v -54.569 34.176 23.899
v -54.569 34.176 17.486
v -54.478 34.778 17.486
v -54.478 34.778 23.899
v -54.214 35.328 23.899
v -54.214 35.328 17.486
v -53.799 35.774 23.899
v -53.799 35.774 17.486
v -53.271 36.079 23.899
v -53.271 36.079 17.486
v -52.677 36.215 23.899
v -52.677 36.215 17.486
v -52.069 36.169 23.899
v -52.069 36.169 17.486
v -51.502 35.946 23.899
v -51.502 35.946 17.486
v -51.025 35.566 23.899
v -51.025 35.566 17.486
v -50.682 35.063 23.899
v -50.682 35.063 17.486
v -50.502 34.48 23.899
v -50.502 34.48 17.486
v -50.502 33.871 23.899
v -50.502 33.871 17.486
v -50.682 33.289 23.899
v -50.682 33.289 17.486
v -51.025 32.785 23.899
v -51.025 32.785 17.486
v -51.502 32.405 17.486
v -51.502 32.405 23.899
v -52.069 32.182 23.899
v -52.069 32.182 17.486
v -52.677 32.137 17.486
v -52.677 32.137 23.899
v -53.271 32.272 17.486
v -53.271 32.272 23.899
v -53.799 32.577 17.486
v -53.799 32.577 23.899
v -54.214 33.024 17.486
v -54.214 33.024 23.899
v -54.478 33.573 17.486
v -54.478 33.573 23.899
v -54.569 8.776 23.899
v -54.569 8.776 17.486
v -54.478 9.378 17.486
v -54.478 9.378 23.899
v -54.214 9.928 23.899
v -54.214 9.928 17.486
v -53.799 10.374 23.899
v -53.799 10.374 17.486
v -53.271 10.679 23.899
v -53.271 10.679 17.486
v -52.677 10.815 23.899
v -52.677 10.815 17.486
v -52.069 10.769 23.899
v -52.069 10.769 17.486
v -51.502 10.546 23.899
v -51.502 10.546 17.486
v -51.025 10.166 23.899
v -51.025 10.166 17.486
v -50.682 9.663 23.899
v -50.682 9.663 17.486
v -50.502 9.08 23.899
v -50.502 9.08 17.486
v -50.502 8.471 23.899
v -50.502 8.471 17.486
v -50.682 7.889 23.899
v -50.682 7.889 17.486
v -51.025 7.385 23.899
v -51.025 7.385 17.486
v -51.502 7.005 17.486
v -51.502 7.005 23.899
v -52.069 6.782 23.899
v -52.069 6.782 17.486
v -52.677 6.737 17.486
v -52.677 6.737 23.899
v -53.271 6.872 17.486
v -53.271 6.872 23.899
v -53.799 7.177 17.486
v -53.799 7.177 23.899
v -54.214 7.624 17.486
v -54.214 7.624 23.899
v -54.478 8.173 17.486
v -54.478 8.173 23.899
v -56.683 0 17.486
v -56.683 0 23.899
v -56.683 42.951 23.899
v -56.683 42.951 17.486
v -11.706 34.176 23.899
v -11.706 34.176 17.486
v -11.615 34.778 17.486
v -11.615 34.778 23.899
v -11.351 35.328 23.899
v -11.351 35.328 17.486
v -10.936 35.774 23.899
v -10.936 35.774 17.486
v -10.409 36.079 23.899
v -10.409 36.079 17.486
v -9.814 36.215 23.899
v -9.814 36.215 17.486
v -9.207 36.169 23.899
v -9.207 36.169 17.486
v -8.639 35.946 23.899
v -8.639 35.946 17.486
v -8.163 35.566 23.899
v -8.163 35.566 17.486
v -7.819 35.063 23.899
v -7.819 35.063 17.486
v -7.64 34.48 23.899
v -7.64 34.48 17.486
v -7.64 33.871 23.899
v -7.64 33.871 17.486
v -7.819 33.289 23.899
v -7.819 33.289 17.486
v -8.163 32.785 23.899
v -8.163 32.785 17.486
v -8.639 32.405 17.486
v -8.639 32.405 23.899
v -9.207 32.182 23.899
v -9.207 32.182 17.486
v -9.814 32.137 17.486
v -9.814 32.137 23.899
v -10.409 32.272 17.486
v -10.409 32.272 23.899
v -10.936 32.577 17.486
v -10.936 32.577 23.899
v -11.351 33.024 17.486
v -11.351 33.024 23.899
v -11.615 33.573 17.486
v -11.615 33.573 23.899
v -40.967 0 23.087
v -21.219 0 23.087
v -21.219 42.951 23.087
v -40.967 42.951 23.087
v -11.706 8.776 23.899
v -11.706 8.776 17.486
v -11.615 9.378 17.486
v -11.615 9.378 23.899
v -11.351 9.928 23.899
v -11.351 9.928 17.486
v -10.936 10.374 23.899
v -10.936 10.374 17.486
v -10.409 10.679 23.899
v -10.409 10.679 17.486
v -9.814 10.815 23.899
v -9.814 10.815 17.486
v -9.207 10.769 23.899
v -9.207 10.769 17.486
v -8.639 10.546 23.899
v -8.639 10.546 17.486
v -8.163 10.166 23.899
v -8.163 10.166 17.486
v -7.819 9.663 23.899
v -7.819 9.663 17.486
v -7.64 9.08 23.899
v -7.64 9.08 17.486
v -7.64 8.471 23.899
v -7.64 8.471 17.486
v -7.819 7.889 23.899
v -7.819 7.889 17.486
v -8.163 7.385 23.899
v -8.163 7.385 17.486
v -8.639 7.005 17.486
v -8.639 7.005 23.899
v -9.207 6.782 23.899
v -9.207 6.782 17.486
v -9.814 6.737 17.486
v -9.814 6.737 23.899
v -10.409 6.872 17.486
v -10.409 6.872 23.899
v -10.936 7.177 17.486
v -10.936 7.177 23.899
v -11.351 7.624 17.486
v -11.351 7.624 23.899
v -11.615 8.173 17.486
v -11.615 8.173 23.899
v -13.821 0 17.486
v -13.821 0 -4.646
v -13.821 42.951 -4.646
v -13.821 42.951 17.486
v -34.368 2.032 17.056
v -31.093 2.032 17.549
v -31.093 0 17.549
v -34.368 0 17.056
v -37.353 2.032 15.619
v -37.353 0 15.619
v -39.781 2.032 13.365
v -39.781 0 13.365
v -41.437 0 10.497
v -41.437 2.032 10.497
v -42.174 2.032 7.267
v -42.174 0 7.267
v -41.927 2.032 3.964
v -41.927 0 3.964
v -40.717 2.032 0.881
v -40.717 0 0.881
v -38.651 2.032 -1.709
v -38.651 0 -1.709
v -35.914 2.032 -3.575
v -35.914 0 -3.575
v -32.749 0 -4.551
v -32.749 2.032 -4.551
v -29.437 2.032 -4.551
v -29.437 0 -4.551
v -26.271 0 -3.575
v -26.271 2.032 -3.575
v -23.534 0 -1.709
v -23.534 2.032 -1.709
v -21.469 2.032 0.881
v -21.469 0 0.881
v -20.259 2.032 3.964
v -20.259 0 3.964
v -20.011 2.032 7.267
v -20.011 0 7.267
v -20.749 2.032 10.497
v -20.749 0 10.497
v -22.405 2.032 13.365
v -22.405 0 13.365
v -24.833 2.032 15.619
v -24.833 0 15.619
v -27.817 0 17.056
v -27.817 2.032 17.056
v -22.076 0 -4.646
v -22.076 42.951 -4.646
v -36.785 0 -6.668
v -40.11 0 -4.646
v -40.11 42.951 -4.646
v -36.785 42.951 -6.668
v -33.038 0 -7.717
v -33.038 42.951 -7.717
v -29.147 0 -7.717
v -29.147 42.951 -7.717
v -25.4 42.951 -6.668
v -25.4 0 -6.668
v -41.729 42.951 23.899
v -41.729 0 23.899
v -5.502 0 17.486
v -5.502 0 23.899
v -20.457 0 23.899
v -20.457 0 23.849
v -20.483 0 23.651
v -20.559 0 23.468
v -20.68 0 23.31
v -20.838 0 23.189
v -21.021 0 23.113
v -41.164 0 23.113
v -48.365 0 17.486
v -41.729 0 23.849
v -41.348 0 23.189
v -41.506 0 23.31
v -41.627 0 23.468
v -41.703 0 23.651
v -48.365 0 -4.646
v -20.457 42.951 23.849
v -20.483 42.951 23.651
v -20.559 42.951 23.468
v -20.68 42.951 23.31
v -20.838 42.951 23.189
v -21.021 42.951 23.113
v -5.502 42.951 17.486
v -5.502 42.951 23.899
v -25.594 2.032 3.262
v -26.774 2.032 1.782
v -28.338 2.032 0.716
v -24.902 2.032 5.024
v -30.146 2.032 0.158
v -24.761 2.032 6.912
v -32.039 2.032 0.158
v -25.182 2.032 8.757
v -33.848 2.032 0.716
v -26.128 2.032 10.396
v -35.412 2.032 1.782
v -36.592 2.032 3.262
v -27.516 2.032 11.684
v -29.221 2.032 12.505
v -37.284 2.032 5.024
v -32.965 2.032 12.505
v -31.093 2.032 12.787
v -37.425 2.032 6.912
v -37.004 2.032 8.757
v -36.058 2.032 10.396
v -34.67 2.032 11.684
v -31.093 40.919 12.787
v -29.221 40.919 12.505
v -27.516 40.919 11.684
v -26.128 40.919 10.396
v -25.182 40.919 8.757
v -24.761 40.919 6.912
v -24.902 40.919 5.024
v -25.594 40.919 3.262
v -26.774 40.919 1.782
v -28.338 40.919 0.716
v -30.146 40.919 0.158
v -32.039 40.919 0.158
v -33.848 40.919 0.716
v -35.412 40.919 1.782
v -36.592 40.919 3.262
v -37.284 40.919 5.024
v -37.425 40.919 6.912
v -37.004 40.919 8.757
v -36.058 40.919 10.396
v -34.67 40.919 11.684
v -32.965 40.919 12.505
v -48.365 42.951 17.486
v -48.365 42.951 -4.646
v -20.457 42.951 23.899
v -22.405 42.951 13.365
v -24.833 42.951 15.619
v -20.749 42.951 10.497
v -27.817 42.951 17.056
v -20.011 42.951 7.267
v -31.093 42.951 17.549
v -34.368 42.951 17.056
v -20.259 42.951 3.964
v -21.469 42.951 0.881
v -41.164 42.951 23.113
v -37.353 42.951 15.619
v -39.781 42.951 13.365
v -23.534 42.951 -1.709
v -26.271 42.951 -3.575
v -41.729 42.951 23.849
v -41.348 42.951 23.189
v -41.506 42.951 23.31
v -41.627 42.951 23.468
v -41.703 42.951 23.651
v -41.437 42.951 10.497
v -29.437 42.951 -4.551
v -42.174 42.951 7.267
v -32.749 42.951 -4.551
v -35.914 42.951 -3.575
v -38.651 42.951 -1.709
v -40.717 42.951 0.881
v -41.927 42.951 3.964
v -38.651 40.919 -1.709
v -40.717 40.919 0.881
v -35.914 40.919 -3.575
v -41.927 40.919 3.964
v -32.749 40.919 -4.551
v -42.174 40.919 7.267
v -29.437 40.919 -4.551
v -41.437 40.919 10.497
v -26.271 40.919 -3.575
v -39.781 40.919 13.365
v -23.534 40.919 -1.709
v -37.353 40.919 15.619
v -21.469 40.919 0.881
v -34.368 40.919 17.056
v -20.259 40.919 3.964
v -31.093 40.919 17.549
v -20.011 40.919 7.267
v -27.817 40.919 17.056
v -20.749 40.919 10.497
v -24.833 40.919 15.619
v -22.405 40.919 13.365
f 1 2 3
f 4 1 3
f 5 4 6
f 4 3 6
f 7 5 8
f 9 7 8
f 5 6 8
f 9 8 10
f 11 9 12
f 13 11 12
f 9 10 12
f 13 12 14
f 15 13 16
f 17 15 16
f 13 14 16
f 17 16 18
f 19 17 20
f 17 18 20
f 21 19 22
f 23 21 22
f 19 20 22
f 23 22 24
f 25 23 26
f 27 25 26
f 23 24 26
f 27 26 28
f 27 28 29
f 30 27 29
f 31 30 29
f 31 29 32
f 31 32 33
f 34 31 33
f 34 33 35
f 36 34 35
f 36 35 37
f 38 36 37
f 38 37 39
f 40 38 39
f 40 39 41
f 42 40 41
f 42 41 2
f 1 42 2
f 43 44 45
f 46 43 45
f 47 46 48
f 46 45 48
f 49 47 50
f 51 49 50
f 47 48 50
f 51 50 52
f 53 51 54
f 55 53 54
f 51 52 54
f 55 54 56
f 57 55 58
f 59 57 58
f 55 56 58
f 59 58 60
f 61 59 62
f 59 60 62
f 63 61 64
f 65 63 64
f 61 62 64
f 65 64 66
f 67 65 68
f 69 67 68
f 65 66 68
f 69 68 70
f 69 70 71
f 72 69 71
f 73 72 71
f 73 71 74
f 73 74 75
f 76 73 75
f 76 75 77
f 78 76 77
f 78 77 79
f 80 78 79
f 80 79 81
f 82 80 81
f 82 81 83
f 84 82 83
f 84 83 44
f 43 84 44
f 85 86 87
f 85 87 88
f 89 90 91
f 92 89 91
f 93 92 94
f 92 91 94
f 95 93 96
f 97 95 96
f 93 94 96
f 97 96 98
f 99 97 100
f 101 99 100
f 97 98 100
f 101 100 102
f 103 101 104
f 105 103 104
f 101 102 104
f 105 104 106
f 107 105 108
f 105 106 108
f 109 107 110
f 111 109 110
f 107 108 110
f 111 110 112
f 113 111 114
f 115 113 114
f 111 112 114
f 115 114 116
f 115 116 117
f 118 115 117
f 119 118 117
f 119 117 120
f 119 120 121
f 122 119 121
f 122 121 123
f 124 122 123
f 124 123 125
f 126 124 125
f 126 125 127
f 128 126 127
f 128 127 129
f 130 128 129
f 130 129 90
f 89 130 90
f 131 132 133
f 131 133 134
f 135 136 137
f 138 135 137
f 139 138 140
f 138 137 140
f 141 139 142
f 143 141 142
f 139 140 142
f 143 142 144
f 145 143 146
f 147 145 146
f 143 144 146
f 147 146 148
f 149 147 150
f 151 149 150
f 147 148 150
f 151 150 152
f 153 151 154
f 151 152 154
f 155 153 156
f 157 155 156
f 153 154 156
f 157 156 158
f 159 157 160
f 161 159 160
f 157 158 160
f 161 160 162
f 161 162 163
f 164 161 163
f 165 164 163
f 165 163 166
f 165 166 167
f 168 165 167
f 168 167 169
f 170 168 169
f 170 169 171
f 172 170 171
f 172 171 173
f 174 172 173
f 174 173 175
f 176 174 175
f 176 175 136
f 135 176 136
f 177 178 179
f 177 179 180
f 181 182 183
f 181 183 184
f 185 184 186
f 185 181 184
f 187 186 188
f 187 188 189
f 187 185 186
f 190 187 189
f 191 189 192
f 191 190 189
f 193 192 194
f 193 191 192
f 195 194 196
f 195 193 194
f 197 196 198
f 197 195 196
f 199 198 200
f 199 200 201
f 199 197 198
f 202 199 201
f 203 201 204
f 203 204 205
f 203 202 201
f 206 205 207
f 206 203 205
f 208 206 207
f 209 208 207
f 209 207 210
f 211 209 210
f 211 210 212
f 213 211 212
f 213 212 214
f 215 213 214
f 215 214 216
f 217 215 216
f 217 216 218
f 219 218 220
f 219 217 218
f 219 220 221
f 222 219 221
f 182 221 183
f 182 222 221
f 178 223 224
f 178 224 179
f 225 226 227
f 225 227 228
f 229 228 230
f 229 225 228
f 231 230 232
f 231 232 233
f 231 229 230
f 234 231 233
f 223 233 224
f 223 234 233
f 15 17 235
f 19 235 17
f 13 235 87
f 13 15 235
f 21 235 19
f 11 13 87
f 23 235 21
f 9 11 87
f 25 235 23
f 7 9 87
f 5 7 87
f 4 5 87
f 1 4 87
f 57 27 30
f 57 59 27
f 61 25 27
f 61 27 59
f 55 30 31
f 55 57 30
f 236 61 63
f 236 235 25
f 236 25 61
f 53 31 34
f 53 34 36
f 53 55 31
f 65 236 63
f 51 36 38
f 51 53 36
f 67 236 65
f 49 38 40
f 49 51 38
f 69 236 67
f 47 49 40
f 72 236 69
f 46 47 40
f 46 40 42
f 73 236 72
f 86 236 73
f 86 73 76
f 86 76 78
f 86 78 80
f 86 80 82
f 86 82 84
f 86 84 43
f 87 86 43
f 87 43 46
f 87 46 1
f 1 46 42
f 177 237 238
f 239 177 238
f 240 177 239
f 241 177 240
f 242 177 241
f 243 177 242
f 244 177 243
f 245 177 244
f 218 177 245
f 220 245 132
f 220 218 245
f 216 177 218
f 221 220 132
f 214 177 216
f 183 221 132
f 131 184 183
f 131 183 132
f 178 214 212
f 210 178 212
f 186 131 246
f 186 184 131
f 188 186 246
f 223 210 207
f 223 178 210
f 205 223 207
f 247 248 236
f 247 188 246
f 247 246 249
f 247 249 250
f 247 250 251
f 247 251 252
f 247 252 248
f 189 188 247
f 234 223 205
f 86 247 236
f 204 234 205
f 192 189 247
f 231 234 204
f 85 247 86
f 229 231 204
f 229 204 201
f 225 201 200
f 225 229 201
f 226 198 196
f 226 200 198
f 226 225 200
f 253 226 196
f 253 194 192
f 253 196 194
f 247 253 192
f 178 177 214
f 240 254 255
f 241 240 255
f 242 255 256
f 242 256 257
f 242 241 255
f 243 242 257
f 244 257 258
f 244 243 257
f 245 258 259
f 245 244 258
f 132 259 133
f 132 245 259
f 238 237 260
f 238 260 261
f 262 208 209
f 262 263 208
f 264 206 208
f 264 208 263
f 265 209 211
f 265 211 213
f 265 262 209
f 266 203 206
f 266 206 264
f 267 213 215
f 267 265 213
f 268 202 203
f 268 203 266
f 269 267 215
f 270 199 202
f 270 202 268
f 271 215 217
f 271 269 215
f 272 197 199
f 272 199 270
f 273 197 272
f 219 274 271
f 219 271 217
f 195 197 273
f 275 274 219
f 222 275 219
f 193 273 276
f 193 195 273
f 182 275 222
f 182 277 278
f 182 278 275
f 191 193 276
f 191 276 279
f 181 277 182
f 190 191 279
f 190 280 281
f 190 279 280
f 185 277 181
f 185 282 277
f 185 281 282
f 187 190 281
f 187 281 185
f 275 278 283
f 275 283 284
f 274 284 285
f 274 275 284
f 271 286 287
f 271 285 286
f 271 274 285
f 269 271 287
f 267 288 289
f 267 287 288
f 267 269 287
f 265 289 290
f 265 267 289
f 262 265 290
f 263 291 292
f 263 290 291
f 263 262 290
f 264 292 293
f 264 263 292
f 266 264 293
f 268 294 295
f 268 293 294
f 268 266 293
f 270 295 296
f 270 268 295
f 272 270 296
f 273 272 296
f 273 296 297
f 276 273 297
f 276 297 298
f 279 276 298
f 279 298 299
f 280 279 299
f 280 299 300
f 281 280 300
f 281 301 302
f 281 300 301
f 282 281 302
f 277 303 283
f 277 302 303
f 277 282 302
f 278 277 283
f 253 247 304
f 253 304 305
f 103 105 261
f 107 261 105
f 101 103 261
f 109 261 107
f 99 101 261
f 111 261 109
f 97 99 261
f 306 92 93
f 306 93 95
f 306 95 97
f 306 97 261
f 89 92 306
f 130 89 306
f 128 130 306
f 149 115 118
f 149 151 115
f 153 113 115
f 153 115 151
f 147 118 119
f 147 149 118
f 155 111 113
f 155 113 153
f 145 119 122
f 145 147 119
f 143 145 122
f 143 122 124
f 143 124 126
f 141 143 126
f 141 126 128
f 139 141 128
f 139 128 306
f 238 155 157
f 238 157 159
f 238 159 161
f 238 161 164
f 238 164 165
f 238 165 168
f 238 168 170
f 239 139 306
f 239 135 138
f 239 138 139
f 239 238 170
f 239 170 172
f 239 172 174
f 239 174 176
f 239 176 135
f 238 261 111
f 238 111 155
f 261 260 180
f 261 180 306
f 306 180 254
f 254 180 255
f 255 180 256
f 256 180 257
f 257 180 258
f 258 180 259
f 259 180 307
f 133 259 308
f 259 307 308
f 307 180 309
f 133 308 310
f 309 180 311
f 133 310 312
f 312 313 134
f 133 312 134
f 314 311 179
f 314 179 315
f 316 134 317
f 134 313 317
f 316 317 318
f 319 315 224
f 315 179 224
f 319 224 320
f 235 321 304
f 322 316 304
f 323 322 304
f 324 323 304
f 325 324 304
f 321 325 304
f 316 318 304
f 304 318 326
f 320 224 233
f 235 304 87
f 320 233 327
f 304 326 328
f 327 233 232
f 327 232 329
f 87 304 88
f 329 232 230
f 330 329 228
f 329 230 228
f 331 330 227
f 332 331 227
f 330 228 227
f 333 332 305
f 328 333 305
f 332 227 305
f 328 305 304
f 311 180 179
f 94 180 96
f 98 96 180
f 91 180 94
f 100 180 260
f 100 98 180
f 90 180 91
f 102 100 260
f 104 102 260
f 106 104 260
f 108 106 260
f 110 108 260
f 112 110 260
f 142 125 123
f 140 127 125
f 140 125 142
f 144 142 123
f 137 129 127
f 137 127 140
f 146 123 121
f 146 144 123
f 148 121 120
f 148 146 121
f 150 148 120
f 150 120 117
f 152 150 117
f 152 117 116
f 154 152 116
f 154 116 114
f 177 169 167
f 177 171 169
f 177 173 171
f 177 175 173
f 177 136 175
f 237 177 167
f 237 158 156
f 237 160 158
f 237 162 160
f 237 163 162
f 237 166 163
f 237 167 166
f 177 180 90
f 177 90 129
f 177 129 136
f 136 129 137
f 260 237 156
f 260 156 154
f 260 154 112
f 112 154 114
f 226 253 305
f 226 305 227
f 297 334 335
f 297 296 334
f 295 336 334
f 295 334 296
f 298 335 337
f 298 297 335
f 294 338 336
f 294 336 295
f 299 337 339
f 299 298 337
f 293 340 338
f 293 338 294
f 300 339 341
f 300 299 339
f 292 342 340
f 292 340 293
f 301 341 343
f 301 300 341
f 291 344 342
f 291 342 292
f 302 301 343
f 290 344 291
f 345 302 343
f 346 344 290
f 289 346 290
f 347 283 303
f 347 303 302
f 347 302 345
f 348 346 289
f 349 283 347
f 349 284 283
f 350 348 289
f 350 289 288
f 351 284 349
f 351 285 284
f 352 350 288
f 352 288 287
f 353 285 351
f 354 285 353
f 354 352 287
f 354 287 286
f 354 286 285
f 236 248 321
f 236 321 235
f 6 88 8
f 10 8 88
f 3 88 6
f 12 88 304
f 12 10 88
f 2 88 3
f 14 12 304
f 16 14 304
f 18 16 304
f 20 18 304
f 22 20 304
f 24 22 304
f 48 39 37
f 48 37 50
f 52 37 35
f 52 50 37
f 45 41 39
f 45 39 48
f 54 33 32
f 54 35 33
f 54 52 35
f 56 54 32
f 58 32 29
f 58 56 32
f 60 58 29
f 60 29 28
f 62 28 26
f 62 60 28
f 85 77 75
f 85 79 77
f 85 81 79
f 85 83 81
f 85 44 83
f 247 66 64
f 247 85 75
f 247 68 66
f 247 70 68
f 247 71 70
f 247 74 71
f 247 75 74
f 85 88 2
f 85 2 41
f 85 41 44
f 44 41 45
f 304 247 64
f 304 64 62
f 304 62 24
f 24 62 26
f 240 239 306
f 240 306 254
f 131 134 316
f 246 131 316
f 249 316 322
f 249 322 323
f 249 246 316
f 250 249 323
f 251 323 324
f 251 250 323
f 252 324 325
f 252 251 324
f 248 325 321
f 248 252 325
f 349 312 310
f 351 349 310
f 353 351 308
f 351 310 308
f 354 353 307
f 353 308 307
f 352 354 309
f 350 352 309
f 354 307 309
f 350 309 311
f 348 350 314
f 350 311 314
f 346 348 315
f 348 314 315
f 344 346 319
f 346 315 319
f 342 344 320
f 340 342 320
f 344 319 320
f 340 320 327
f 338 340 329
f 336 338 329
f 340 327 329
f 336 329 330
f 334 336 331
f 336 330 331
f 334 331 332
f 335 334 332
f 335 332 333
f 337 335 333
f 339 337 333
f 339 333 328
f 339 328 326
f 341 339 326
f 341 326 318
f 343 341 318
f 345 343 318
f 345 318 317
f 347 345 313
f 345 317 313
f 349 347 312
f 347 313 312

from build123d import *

# Parameters (mm, degrees)
SKETCH1_R           = 6.35
BOSS_EXTRUDE1_DEPTH = 42.9514
SKETCH2_R           = 11.1125
CUT_EXTRUDE1_DEPTH  = 2.032
CUT_EXTRUDE2_START  = -2.032
SKETCH3_R           = 11.1125
CUT_EXTRUDE2_DEPTH  = 2.032
SKETCH8_R           = 2.0447
CUT_EXTRUDE3_DEPTH  = 76.496791448


with BuildPart() as part:
    # Sketch1 → Boss-Extrude1 (new body)
    with BuildSketch(Plane(origin=(0, 0, 0), x_dir=(1, 0, 0), z_dir=(0, 1, 0))):
        with BuildLine():
            Line((-41.729120795, -23.848667038), (-41.729120795, -23.899467038))
            Line((-41.729120795, -23.899467038), (-56.683370795, -23.899467038))
            Line((-56.683370795, -23.899467038), (-56.683370795, -17.485967038))
            Line((-56.683370795, -17.485967038), (-48.364870795, -17.485967038))
            Line((-48.364870795, -17.485967038), (-48.364870795, 4.645738735))
            Line((-48.364870795, 4.645738735), (-40.109870795, 4.645738735))
            ThreePointArc((-40.109870795, 4.645738735), (-31.092870795, 7.850532962), (-22.075870795, 4.645738735))
            Line((-22.075870795, 4.645738735), (-13.820870795, 4.645738735))
            Line((-13.820870795, 4.645738735), (-13.820870795, -17.485967038))
            Line((-13.820870795, -17.485967038), (-5.502370795, -17.485967038))
            Line((-5.502370795, -17.485967038), (-5.502370795, -23.899467038))
            Line((-5.502370795, -23.899467038), (-20.456620795, -23.899467038))
            Line((-20.456620795, -23.899467038), (-20.456620795, -23.848667038))
            ThreePointArc((-20.456620795, -23.848667038), (-20.679805428, -23.309851671), (-21.218620795, -23.086667038))
            Line((-21.218620795, -23.086667038), (-40.967120795, -23.086667038))
            ThreePointArc((-40.967120795, -23.086667038), (-41.505936162, -23.309851671), (-41.729120795, -23.848667038))
        make_face()
        with Locations(Location((-31.092870795, -6.436967038, 0), (0, 0, 270))):
            Circle(SKETCH1_R, mode=Mode.SUBTRACT)
    extrude(amount=BOSS_EXTRUDE1_DEPTH)

    # Sketch2 → Cut-Extrude1 (cut)
    with BuildSketch(Plane(origin=(0, 42.9514, 0), x_dir=(1, 0, 0), z_dir=(0, 1, 0))):
        with Locations(Location((-31.092870795, -6.436967038, 0), (0, 0, 270))):
            Circle(SKETCH2_R)
    extrude(amount=-CUT_EXTRUDE1_DEPTH, mode=Mode.SUBTRACT)

    # Sketch3 → Cut-Extrude2 (cut)
    with BuildSketch(Plane.XZ.offset(CUT_EXTRUDE2_START)):
        with Locations(Location((-31.092870795, 6.436967038, 0), (0, 0, 90))):
            Circle(SKETCH3_R)
    extrude(amount=CUT_EXTRUDE2_DEPTH, mode=Mode.SUBTRACT)

    # Sketch8 → Cut-Extrude3 (cut, through all)
    with BuildSketch(Plane(origin=(0, 0, 17.485967038), x_dir=(-1, 0, 0), z_dir=(0, 0, -1))):
        with Locations((52.524120795, 8.7757)):
            Circle(SKETCH8_R)
        with Locations((52.524120795, 34.1757)):
            Circle(SKETCH8_R)
        with Locations((9.661620795, 8.7757)):
            Circle(SKETCH8_R)
        with Locations((9.661620795, 34.1757)):
            Circle(SKETCH8_R)
    extrude(amount=-CUT_EXTRUDE3_DEPTH, mode=Mode.SUBTRACT)


solid = part.part
